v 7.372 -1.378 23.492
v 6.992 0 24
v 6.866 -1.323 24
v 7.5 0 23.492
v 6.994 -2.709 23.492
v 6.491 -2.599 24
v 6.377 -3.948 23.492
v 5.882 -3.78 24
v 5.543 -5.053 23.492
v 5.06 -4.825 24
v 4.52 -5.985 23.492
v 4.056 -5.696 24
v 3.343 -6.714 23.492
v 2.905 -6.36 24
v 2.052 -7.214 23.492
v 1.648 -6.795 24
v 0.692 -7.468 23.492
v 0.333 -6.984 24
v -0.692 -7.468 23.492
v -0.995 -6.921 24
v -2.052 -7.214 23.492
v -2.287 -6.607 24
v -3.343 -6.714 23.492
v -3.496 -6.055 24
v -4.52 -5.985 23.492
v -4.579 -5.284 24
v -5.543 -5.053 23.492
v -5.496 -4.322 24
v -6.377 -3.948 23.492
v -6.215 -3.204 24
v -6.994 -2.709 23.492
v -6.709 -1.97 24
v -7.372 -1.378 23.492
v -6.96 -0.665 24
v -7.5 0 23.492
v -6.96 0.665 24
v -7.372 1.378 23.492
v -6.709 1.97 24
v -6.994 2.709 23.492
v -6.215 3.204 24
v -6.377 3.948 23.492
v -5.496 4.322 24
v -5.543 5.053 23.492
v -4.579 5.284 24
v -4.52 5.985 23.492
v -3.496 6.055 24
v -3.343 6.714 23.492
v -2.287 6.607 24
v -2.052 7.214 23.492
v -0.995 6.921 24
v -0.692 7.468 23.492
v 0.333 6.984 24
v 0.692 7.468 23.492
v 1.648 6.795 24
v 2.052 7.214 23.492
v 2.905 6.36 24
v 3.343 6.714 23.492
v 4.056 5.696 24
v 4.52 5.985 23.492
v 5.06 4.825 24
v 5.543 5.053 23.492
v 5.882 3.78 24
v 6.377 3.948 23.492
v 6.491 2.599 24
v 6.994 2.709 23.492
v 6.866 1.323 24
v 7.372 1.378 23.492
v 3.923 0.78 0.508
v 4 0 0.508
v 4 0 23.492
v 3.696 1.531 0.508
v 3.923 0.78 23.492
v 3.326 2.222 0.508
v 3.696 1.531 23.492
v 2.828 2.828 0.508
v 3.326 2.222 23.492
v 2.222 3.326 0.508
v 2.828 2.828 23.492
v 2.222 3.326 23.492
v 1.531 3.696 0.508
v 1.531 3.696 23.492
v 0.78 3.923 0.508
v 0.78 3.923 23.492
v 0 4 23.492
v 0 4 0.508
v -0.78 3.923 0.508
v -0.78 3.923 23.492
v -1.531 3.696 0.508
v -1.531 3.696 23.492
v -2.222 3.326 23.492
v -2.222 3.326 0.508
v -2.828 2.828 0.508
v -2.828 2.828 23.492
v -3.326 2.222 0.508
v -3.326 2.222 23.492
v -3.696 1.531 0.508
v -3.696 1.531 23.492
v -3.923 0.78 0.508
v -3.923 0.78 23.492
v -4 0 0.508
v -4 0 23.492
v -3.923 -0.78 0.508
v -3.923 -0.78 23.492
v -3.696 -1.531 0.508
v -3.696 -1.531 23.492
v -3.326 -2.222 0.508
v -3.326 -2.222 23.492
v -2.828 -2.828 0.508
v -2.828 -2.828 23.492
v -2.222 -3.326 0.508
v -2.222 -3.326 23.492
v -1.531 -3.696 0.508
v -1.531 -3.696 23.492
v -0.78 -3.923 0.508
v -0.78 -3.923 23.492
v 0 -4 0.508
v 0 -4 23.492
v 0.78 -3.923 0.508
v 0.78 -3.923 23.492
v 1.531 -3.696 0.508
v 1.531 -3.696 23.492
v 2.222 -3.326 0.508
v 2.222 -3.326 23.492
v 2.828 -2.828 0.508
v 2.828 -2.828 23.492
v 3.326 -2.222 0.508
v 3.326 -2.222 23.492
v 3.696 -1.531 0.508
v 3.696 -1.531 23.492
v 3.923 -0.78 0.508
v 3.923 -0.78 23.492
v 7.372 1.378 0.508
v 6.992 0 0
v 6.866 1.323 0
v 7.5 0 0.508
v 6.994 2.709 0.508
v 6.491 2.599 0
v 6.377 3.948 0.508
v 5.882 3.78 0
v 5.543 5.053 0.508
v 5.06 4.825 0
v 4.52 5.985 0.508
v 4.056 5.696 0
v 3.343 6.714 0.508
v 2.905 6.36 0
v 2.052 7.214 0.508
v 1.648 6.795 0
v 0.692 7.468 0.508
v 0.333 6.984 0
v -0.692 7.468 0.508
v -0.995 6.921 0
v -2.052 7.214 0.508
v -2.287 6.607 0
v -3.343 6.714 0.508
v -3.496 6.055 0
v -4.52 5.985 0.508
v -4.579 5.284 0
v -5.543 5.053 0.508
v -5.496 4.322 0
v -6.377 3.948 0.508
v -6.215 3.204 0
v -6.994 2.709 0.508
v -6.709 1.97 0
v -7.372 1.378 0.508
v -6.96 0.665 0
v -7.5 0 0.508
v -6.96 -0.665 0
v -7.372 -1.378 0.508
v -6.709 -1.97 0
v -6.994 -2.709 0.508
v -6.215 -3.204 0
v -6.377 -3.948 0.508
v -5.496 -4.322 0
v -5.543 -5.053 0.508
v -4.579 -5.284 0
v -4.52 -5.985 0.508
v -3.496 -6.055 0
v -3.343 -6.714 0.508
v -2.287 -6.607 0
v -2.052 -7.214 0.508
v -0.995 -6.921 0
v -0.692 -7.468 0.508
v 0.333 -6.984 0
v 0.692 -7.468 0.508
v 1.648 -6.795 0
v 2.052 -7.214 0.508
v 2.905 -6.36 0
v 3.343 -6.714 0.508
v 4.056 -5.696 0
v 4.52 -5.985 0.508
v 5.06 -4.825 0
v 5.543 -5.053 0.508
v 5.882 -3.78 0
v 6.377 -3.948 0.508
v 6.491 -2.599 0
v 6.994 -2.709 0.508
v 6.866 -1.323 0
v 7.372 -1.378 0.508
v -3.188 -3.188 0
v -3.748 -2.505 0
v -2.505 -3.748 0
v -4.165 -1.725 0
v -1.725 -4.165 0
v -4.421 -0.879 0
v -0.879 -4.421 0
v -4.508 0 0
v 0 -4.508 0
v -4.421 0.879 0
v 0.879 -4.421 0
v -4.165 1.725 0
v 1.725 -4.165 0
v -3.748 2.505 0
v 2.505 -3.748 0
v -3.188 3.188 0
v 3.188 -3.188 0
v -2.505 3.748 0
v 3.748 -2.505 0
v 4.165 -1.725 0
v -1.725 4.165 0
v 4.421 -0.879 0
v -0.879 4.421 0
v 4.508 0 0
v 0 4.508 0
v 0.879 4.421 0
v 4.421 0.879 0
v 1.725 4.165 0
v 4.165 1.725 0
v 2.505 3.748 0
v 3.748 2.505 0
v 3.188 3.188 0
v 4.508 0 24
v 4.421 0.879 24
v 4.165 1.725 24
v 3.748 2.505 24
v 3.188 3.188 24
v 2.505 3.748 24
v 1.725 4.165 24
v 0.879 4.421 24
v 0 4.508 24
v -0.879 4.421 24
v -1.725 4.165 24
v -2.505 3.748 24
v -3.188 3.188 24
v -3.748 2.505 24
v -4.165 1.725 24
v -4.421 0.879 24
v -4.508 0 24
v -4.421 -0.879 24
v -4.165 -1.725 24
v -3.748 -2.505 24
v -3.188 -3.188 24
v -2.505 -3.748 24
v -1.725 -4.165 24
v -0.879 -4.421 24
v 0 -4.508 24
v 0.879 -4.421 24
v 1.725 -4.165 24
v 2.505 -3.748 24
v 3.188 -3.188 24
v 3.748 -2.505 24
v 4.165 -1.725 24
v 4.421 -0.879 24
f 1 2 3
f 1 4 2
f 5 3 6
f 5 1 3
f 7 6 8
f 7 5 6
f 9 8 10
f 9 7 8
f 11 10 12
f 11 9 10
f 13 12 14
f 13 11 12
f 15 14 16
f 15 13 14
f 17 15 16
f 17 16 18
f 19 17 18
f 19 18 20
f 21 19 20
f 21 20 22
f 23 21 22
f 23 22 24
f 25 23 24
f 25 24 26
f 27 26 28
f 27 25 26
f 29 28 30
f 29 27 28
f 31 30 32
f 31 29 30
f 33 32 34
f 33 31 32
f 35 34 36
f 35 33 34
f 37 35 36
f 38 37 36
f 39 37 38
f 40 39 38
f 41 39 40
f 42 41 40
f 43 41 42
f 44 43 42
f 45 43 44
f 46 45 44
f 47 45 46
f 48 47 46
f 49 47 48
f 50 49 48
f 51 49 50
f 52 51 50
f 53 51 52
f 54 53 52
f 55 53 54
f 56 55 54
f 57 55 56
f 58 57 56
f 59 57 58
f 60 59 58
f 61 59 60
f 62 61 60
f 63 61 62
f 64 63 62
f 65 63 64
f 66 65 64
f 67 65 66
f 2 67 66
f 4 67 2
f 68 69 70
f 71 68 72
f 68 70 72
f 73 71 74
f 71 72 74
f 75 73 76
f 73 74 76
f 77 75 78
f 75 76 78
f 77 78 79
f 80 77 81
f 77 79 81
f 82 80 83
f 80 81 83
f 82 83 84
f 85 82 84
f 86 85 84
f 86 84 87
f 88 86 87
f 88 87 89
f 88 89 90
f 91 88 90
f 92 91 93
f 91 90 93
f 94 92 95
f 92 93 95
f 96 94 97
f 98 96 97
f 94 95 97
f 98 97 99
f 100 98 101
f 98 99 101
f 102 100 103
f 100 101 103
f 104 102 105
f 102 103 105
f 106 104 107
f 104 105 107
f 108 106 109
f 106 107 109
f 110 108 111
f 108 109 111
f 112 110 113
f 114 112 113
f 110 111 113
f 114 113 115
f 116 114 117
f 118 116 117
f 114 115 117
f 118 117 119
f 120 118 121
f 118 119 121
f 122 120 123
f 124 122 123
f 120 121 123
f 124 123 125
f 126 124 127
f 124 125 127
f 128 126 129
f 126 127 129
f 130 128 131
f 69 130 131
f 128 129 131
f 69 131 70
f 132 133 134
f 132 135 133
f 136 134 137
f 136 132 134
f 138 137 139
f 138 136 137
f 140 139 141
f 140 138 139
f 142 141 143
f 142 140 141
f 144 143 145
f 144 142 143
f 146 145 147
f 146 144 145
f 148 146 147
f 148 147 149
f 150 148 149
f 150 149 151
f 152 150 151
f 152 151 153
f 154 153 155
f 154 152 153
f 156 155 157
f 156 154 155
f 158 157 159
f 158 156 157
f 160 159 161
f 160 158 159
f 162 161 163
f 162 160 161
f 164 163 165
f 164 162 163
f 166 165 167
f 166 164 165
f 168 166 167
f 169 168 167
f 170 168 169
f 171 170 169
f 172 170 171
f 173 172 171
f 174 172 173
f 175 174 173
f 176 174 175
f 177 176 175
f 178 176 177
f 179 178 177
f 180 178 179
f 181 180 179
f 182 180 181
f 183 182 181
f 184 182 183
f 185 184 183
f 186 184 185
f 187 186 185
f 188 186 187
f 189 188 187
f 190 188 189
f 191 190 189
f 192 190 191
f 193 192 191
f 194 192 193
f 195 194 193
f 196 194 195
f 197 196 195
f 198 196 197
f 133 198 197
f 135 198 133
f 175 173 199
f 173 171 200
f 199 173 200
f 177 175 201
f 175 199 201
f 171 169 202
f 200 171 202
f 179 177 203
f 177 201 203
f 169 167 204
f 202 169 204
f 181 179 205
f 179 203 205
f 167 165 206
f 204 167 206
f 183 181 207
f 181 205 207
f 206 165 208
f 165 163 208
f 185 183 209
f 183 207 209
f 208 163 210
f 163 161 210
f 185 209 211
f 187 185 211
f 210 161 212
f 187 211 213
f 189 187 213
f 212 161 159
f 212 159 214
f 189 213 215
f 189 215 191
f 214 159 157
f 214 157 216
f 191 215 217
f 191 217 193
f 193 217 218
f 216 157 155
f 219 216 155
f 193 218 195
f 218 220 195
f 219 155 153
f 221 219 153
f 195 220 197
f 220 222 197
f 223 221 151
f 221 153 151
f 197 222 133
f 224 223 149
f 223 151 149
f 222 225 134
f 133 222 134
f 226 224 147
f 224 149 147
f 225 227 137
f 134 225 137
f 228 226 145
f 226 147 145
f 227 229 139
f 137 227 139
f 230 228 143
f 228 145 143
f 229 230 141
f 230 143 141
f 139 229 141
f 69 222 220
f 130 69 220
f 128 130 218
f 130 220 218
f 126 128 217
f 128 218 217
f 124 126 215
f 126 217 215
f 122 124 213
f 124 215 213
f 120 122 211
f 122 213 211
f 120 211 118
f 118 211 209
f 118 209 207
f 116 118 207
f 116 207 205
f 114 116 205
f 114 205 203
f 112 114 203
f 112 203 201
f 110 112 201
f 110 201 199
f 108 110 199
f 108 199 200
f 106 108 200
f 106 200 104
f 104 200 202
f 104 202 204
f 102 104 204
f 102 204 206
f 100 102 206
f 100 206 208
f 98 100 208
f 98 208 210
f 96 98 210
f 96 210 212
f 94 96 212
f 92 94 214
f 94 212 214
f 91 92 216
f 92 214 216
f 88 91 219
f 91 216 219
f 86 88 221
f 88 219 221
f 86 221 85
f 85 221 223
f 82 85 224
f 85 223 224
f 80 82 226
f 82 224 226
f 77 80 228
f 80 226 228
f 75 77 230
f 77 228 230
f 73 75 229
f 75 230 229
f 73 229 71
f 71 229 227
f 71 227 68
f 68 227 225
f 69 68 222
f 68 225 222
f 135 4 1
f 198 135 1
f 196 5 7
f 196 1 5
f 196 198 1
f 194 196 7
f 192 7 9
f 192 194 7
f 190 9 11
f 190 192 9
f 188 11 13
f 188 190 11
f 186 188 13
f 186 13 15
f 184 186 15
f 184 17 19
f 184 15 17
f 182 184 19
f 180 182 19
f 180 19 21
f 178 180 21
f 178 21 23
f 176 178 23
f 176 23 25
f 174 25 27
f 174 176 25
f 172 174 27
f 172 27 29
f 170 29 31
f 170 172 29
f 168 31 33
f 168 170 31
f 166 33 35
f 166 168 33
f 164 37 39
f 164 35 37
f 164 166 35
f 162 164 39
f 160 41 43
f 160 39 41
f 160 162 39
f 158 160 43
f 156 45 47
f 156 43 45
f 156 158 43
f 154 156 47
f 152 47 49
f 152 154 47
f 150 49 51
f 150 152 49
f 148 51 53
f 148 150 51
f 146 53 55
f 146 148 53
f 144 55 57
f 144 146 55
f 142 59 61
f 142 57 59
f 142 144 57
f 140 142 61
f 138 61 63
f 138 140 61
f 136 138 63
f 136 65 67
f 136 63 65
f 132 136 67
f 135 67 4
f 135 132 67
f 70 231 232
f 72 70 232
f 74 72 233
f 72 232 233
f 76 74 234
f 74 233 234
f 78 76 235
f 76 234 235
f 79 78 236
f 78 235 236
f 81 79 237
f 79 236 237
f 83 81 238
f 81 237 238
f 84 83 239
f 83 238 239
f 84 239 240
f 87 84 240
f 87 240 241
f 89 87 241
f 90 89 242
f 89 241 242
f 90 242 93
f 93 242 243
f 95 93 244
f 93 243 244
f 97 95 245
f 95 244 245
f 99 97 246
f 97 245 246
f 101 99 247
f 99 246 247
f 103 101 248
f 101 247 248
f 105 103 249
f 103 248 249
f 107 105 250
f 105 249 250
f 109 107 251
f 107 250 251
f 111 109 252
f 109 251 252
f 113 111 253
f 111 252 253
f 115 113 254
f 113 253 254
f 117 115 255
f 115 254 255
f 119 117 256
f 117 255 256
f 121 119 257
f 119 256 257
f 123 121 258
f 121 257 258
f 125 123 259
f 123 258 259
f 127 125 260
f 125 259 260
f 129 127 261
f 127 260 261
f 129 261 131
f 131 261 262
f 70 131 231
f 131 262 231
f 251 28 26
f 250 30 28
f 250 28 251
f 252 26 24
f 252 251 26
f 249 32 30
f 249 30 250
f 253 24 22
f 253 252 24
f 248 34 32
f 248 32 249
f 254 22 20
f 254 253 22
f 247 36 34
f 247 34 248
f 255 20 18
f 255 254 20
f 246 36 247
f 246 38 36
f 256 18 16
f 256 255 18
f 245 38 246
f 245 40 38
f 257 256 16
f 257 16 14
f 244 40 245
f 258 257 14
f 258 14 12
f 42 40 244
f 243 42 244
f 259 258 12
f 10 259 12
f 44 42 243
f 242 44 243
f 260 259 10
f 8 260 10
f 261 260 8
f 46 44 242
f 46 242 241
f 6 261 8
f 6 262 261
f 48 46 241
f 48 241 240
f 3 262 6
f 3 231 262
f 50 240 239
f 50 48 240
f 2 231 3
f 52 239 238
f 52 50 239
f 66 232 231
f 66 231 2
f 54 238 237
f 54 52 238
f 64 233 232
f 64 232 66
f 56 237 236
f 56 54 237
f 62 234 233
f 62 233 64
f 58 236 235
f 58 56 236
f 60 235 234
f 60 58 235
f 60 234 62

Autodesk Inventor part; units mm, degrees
ref_plane "YZ Plane" through (0, 0, 0) normal (1, 0, 0) x (0, 1, 0)
ref_plane "XZ Plane" through (0, 0, 0) normal (0, 1, 0) x (-1, 0, 0)
ref_plane "XY Plane" through (0, 0, 0) normal (0, 0, 1) x (1, 0, 0)
sketch "Sketch1" plane through (0, 0, 0) normal (0, 0, 1) x (1, 0, 0)
  circle A0 centre (0, 0) radius 7.5
  dimension "d0" = 15
extrude "Extrusion1" add sketch "Sketch1" along normal blind 24
sketch "Sketch2" plane through (0, 0, 24) normal (0, 0, 1) x (1, 0, 0)
  circle A0 centre (0, 0) radius 4
  dimension "d3" = 8
extrude "Extrusion2" cut sketch "Sketch2" against normal through all
chamfer "Chamfer1" distance 0.508 angle 45 4 edges at (-7.5, 0, 24) (-4, 0, 24) (-7.5, 0, 0) (-4, 0, 0)
properties part number "lm8uu rough model"
